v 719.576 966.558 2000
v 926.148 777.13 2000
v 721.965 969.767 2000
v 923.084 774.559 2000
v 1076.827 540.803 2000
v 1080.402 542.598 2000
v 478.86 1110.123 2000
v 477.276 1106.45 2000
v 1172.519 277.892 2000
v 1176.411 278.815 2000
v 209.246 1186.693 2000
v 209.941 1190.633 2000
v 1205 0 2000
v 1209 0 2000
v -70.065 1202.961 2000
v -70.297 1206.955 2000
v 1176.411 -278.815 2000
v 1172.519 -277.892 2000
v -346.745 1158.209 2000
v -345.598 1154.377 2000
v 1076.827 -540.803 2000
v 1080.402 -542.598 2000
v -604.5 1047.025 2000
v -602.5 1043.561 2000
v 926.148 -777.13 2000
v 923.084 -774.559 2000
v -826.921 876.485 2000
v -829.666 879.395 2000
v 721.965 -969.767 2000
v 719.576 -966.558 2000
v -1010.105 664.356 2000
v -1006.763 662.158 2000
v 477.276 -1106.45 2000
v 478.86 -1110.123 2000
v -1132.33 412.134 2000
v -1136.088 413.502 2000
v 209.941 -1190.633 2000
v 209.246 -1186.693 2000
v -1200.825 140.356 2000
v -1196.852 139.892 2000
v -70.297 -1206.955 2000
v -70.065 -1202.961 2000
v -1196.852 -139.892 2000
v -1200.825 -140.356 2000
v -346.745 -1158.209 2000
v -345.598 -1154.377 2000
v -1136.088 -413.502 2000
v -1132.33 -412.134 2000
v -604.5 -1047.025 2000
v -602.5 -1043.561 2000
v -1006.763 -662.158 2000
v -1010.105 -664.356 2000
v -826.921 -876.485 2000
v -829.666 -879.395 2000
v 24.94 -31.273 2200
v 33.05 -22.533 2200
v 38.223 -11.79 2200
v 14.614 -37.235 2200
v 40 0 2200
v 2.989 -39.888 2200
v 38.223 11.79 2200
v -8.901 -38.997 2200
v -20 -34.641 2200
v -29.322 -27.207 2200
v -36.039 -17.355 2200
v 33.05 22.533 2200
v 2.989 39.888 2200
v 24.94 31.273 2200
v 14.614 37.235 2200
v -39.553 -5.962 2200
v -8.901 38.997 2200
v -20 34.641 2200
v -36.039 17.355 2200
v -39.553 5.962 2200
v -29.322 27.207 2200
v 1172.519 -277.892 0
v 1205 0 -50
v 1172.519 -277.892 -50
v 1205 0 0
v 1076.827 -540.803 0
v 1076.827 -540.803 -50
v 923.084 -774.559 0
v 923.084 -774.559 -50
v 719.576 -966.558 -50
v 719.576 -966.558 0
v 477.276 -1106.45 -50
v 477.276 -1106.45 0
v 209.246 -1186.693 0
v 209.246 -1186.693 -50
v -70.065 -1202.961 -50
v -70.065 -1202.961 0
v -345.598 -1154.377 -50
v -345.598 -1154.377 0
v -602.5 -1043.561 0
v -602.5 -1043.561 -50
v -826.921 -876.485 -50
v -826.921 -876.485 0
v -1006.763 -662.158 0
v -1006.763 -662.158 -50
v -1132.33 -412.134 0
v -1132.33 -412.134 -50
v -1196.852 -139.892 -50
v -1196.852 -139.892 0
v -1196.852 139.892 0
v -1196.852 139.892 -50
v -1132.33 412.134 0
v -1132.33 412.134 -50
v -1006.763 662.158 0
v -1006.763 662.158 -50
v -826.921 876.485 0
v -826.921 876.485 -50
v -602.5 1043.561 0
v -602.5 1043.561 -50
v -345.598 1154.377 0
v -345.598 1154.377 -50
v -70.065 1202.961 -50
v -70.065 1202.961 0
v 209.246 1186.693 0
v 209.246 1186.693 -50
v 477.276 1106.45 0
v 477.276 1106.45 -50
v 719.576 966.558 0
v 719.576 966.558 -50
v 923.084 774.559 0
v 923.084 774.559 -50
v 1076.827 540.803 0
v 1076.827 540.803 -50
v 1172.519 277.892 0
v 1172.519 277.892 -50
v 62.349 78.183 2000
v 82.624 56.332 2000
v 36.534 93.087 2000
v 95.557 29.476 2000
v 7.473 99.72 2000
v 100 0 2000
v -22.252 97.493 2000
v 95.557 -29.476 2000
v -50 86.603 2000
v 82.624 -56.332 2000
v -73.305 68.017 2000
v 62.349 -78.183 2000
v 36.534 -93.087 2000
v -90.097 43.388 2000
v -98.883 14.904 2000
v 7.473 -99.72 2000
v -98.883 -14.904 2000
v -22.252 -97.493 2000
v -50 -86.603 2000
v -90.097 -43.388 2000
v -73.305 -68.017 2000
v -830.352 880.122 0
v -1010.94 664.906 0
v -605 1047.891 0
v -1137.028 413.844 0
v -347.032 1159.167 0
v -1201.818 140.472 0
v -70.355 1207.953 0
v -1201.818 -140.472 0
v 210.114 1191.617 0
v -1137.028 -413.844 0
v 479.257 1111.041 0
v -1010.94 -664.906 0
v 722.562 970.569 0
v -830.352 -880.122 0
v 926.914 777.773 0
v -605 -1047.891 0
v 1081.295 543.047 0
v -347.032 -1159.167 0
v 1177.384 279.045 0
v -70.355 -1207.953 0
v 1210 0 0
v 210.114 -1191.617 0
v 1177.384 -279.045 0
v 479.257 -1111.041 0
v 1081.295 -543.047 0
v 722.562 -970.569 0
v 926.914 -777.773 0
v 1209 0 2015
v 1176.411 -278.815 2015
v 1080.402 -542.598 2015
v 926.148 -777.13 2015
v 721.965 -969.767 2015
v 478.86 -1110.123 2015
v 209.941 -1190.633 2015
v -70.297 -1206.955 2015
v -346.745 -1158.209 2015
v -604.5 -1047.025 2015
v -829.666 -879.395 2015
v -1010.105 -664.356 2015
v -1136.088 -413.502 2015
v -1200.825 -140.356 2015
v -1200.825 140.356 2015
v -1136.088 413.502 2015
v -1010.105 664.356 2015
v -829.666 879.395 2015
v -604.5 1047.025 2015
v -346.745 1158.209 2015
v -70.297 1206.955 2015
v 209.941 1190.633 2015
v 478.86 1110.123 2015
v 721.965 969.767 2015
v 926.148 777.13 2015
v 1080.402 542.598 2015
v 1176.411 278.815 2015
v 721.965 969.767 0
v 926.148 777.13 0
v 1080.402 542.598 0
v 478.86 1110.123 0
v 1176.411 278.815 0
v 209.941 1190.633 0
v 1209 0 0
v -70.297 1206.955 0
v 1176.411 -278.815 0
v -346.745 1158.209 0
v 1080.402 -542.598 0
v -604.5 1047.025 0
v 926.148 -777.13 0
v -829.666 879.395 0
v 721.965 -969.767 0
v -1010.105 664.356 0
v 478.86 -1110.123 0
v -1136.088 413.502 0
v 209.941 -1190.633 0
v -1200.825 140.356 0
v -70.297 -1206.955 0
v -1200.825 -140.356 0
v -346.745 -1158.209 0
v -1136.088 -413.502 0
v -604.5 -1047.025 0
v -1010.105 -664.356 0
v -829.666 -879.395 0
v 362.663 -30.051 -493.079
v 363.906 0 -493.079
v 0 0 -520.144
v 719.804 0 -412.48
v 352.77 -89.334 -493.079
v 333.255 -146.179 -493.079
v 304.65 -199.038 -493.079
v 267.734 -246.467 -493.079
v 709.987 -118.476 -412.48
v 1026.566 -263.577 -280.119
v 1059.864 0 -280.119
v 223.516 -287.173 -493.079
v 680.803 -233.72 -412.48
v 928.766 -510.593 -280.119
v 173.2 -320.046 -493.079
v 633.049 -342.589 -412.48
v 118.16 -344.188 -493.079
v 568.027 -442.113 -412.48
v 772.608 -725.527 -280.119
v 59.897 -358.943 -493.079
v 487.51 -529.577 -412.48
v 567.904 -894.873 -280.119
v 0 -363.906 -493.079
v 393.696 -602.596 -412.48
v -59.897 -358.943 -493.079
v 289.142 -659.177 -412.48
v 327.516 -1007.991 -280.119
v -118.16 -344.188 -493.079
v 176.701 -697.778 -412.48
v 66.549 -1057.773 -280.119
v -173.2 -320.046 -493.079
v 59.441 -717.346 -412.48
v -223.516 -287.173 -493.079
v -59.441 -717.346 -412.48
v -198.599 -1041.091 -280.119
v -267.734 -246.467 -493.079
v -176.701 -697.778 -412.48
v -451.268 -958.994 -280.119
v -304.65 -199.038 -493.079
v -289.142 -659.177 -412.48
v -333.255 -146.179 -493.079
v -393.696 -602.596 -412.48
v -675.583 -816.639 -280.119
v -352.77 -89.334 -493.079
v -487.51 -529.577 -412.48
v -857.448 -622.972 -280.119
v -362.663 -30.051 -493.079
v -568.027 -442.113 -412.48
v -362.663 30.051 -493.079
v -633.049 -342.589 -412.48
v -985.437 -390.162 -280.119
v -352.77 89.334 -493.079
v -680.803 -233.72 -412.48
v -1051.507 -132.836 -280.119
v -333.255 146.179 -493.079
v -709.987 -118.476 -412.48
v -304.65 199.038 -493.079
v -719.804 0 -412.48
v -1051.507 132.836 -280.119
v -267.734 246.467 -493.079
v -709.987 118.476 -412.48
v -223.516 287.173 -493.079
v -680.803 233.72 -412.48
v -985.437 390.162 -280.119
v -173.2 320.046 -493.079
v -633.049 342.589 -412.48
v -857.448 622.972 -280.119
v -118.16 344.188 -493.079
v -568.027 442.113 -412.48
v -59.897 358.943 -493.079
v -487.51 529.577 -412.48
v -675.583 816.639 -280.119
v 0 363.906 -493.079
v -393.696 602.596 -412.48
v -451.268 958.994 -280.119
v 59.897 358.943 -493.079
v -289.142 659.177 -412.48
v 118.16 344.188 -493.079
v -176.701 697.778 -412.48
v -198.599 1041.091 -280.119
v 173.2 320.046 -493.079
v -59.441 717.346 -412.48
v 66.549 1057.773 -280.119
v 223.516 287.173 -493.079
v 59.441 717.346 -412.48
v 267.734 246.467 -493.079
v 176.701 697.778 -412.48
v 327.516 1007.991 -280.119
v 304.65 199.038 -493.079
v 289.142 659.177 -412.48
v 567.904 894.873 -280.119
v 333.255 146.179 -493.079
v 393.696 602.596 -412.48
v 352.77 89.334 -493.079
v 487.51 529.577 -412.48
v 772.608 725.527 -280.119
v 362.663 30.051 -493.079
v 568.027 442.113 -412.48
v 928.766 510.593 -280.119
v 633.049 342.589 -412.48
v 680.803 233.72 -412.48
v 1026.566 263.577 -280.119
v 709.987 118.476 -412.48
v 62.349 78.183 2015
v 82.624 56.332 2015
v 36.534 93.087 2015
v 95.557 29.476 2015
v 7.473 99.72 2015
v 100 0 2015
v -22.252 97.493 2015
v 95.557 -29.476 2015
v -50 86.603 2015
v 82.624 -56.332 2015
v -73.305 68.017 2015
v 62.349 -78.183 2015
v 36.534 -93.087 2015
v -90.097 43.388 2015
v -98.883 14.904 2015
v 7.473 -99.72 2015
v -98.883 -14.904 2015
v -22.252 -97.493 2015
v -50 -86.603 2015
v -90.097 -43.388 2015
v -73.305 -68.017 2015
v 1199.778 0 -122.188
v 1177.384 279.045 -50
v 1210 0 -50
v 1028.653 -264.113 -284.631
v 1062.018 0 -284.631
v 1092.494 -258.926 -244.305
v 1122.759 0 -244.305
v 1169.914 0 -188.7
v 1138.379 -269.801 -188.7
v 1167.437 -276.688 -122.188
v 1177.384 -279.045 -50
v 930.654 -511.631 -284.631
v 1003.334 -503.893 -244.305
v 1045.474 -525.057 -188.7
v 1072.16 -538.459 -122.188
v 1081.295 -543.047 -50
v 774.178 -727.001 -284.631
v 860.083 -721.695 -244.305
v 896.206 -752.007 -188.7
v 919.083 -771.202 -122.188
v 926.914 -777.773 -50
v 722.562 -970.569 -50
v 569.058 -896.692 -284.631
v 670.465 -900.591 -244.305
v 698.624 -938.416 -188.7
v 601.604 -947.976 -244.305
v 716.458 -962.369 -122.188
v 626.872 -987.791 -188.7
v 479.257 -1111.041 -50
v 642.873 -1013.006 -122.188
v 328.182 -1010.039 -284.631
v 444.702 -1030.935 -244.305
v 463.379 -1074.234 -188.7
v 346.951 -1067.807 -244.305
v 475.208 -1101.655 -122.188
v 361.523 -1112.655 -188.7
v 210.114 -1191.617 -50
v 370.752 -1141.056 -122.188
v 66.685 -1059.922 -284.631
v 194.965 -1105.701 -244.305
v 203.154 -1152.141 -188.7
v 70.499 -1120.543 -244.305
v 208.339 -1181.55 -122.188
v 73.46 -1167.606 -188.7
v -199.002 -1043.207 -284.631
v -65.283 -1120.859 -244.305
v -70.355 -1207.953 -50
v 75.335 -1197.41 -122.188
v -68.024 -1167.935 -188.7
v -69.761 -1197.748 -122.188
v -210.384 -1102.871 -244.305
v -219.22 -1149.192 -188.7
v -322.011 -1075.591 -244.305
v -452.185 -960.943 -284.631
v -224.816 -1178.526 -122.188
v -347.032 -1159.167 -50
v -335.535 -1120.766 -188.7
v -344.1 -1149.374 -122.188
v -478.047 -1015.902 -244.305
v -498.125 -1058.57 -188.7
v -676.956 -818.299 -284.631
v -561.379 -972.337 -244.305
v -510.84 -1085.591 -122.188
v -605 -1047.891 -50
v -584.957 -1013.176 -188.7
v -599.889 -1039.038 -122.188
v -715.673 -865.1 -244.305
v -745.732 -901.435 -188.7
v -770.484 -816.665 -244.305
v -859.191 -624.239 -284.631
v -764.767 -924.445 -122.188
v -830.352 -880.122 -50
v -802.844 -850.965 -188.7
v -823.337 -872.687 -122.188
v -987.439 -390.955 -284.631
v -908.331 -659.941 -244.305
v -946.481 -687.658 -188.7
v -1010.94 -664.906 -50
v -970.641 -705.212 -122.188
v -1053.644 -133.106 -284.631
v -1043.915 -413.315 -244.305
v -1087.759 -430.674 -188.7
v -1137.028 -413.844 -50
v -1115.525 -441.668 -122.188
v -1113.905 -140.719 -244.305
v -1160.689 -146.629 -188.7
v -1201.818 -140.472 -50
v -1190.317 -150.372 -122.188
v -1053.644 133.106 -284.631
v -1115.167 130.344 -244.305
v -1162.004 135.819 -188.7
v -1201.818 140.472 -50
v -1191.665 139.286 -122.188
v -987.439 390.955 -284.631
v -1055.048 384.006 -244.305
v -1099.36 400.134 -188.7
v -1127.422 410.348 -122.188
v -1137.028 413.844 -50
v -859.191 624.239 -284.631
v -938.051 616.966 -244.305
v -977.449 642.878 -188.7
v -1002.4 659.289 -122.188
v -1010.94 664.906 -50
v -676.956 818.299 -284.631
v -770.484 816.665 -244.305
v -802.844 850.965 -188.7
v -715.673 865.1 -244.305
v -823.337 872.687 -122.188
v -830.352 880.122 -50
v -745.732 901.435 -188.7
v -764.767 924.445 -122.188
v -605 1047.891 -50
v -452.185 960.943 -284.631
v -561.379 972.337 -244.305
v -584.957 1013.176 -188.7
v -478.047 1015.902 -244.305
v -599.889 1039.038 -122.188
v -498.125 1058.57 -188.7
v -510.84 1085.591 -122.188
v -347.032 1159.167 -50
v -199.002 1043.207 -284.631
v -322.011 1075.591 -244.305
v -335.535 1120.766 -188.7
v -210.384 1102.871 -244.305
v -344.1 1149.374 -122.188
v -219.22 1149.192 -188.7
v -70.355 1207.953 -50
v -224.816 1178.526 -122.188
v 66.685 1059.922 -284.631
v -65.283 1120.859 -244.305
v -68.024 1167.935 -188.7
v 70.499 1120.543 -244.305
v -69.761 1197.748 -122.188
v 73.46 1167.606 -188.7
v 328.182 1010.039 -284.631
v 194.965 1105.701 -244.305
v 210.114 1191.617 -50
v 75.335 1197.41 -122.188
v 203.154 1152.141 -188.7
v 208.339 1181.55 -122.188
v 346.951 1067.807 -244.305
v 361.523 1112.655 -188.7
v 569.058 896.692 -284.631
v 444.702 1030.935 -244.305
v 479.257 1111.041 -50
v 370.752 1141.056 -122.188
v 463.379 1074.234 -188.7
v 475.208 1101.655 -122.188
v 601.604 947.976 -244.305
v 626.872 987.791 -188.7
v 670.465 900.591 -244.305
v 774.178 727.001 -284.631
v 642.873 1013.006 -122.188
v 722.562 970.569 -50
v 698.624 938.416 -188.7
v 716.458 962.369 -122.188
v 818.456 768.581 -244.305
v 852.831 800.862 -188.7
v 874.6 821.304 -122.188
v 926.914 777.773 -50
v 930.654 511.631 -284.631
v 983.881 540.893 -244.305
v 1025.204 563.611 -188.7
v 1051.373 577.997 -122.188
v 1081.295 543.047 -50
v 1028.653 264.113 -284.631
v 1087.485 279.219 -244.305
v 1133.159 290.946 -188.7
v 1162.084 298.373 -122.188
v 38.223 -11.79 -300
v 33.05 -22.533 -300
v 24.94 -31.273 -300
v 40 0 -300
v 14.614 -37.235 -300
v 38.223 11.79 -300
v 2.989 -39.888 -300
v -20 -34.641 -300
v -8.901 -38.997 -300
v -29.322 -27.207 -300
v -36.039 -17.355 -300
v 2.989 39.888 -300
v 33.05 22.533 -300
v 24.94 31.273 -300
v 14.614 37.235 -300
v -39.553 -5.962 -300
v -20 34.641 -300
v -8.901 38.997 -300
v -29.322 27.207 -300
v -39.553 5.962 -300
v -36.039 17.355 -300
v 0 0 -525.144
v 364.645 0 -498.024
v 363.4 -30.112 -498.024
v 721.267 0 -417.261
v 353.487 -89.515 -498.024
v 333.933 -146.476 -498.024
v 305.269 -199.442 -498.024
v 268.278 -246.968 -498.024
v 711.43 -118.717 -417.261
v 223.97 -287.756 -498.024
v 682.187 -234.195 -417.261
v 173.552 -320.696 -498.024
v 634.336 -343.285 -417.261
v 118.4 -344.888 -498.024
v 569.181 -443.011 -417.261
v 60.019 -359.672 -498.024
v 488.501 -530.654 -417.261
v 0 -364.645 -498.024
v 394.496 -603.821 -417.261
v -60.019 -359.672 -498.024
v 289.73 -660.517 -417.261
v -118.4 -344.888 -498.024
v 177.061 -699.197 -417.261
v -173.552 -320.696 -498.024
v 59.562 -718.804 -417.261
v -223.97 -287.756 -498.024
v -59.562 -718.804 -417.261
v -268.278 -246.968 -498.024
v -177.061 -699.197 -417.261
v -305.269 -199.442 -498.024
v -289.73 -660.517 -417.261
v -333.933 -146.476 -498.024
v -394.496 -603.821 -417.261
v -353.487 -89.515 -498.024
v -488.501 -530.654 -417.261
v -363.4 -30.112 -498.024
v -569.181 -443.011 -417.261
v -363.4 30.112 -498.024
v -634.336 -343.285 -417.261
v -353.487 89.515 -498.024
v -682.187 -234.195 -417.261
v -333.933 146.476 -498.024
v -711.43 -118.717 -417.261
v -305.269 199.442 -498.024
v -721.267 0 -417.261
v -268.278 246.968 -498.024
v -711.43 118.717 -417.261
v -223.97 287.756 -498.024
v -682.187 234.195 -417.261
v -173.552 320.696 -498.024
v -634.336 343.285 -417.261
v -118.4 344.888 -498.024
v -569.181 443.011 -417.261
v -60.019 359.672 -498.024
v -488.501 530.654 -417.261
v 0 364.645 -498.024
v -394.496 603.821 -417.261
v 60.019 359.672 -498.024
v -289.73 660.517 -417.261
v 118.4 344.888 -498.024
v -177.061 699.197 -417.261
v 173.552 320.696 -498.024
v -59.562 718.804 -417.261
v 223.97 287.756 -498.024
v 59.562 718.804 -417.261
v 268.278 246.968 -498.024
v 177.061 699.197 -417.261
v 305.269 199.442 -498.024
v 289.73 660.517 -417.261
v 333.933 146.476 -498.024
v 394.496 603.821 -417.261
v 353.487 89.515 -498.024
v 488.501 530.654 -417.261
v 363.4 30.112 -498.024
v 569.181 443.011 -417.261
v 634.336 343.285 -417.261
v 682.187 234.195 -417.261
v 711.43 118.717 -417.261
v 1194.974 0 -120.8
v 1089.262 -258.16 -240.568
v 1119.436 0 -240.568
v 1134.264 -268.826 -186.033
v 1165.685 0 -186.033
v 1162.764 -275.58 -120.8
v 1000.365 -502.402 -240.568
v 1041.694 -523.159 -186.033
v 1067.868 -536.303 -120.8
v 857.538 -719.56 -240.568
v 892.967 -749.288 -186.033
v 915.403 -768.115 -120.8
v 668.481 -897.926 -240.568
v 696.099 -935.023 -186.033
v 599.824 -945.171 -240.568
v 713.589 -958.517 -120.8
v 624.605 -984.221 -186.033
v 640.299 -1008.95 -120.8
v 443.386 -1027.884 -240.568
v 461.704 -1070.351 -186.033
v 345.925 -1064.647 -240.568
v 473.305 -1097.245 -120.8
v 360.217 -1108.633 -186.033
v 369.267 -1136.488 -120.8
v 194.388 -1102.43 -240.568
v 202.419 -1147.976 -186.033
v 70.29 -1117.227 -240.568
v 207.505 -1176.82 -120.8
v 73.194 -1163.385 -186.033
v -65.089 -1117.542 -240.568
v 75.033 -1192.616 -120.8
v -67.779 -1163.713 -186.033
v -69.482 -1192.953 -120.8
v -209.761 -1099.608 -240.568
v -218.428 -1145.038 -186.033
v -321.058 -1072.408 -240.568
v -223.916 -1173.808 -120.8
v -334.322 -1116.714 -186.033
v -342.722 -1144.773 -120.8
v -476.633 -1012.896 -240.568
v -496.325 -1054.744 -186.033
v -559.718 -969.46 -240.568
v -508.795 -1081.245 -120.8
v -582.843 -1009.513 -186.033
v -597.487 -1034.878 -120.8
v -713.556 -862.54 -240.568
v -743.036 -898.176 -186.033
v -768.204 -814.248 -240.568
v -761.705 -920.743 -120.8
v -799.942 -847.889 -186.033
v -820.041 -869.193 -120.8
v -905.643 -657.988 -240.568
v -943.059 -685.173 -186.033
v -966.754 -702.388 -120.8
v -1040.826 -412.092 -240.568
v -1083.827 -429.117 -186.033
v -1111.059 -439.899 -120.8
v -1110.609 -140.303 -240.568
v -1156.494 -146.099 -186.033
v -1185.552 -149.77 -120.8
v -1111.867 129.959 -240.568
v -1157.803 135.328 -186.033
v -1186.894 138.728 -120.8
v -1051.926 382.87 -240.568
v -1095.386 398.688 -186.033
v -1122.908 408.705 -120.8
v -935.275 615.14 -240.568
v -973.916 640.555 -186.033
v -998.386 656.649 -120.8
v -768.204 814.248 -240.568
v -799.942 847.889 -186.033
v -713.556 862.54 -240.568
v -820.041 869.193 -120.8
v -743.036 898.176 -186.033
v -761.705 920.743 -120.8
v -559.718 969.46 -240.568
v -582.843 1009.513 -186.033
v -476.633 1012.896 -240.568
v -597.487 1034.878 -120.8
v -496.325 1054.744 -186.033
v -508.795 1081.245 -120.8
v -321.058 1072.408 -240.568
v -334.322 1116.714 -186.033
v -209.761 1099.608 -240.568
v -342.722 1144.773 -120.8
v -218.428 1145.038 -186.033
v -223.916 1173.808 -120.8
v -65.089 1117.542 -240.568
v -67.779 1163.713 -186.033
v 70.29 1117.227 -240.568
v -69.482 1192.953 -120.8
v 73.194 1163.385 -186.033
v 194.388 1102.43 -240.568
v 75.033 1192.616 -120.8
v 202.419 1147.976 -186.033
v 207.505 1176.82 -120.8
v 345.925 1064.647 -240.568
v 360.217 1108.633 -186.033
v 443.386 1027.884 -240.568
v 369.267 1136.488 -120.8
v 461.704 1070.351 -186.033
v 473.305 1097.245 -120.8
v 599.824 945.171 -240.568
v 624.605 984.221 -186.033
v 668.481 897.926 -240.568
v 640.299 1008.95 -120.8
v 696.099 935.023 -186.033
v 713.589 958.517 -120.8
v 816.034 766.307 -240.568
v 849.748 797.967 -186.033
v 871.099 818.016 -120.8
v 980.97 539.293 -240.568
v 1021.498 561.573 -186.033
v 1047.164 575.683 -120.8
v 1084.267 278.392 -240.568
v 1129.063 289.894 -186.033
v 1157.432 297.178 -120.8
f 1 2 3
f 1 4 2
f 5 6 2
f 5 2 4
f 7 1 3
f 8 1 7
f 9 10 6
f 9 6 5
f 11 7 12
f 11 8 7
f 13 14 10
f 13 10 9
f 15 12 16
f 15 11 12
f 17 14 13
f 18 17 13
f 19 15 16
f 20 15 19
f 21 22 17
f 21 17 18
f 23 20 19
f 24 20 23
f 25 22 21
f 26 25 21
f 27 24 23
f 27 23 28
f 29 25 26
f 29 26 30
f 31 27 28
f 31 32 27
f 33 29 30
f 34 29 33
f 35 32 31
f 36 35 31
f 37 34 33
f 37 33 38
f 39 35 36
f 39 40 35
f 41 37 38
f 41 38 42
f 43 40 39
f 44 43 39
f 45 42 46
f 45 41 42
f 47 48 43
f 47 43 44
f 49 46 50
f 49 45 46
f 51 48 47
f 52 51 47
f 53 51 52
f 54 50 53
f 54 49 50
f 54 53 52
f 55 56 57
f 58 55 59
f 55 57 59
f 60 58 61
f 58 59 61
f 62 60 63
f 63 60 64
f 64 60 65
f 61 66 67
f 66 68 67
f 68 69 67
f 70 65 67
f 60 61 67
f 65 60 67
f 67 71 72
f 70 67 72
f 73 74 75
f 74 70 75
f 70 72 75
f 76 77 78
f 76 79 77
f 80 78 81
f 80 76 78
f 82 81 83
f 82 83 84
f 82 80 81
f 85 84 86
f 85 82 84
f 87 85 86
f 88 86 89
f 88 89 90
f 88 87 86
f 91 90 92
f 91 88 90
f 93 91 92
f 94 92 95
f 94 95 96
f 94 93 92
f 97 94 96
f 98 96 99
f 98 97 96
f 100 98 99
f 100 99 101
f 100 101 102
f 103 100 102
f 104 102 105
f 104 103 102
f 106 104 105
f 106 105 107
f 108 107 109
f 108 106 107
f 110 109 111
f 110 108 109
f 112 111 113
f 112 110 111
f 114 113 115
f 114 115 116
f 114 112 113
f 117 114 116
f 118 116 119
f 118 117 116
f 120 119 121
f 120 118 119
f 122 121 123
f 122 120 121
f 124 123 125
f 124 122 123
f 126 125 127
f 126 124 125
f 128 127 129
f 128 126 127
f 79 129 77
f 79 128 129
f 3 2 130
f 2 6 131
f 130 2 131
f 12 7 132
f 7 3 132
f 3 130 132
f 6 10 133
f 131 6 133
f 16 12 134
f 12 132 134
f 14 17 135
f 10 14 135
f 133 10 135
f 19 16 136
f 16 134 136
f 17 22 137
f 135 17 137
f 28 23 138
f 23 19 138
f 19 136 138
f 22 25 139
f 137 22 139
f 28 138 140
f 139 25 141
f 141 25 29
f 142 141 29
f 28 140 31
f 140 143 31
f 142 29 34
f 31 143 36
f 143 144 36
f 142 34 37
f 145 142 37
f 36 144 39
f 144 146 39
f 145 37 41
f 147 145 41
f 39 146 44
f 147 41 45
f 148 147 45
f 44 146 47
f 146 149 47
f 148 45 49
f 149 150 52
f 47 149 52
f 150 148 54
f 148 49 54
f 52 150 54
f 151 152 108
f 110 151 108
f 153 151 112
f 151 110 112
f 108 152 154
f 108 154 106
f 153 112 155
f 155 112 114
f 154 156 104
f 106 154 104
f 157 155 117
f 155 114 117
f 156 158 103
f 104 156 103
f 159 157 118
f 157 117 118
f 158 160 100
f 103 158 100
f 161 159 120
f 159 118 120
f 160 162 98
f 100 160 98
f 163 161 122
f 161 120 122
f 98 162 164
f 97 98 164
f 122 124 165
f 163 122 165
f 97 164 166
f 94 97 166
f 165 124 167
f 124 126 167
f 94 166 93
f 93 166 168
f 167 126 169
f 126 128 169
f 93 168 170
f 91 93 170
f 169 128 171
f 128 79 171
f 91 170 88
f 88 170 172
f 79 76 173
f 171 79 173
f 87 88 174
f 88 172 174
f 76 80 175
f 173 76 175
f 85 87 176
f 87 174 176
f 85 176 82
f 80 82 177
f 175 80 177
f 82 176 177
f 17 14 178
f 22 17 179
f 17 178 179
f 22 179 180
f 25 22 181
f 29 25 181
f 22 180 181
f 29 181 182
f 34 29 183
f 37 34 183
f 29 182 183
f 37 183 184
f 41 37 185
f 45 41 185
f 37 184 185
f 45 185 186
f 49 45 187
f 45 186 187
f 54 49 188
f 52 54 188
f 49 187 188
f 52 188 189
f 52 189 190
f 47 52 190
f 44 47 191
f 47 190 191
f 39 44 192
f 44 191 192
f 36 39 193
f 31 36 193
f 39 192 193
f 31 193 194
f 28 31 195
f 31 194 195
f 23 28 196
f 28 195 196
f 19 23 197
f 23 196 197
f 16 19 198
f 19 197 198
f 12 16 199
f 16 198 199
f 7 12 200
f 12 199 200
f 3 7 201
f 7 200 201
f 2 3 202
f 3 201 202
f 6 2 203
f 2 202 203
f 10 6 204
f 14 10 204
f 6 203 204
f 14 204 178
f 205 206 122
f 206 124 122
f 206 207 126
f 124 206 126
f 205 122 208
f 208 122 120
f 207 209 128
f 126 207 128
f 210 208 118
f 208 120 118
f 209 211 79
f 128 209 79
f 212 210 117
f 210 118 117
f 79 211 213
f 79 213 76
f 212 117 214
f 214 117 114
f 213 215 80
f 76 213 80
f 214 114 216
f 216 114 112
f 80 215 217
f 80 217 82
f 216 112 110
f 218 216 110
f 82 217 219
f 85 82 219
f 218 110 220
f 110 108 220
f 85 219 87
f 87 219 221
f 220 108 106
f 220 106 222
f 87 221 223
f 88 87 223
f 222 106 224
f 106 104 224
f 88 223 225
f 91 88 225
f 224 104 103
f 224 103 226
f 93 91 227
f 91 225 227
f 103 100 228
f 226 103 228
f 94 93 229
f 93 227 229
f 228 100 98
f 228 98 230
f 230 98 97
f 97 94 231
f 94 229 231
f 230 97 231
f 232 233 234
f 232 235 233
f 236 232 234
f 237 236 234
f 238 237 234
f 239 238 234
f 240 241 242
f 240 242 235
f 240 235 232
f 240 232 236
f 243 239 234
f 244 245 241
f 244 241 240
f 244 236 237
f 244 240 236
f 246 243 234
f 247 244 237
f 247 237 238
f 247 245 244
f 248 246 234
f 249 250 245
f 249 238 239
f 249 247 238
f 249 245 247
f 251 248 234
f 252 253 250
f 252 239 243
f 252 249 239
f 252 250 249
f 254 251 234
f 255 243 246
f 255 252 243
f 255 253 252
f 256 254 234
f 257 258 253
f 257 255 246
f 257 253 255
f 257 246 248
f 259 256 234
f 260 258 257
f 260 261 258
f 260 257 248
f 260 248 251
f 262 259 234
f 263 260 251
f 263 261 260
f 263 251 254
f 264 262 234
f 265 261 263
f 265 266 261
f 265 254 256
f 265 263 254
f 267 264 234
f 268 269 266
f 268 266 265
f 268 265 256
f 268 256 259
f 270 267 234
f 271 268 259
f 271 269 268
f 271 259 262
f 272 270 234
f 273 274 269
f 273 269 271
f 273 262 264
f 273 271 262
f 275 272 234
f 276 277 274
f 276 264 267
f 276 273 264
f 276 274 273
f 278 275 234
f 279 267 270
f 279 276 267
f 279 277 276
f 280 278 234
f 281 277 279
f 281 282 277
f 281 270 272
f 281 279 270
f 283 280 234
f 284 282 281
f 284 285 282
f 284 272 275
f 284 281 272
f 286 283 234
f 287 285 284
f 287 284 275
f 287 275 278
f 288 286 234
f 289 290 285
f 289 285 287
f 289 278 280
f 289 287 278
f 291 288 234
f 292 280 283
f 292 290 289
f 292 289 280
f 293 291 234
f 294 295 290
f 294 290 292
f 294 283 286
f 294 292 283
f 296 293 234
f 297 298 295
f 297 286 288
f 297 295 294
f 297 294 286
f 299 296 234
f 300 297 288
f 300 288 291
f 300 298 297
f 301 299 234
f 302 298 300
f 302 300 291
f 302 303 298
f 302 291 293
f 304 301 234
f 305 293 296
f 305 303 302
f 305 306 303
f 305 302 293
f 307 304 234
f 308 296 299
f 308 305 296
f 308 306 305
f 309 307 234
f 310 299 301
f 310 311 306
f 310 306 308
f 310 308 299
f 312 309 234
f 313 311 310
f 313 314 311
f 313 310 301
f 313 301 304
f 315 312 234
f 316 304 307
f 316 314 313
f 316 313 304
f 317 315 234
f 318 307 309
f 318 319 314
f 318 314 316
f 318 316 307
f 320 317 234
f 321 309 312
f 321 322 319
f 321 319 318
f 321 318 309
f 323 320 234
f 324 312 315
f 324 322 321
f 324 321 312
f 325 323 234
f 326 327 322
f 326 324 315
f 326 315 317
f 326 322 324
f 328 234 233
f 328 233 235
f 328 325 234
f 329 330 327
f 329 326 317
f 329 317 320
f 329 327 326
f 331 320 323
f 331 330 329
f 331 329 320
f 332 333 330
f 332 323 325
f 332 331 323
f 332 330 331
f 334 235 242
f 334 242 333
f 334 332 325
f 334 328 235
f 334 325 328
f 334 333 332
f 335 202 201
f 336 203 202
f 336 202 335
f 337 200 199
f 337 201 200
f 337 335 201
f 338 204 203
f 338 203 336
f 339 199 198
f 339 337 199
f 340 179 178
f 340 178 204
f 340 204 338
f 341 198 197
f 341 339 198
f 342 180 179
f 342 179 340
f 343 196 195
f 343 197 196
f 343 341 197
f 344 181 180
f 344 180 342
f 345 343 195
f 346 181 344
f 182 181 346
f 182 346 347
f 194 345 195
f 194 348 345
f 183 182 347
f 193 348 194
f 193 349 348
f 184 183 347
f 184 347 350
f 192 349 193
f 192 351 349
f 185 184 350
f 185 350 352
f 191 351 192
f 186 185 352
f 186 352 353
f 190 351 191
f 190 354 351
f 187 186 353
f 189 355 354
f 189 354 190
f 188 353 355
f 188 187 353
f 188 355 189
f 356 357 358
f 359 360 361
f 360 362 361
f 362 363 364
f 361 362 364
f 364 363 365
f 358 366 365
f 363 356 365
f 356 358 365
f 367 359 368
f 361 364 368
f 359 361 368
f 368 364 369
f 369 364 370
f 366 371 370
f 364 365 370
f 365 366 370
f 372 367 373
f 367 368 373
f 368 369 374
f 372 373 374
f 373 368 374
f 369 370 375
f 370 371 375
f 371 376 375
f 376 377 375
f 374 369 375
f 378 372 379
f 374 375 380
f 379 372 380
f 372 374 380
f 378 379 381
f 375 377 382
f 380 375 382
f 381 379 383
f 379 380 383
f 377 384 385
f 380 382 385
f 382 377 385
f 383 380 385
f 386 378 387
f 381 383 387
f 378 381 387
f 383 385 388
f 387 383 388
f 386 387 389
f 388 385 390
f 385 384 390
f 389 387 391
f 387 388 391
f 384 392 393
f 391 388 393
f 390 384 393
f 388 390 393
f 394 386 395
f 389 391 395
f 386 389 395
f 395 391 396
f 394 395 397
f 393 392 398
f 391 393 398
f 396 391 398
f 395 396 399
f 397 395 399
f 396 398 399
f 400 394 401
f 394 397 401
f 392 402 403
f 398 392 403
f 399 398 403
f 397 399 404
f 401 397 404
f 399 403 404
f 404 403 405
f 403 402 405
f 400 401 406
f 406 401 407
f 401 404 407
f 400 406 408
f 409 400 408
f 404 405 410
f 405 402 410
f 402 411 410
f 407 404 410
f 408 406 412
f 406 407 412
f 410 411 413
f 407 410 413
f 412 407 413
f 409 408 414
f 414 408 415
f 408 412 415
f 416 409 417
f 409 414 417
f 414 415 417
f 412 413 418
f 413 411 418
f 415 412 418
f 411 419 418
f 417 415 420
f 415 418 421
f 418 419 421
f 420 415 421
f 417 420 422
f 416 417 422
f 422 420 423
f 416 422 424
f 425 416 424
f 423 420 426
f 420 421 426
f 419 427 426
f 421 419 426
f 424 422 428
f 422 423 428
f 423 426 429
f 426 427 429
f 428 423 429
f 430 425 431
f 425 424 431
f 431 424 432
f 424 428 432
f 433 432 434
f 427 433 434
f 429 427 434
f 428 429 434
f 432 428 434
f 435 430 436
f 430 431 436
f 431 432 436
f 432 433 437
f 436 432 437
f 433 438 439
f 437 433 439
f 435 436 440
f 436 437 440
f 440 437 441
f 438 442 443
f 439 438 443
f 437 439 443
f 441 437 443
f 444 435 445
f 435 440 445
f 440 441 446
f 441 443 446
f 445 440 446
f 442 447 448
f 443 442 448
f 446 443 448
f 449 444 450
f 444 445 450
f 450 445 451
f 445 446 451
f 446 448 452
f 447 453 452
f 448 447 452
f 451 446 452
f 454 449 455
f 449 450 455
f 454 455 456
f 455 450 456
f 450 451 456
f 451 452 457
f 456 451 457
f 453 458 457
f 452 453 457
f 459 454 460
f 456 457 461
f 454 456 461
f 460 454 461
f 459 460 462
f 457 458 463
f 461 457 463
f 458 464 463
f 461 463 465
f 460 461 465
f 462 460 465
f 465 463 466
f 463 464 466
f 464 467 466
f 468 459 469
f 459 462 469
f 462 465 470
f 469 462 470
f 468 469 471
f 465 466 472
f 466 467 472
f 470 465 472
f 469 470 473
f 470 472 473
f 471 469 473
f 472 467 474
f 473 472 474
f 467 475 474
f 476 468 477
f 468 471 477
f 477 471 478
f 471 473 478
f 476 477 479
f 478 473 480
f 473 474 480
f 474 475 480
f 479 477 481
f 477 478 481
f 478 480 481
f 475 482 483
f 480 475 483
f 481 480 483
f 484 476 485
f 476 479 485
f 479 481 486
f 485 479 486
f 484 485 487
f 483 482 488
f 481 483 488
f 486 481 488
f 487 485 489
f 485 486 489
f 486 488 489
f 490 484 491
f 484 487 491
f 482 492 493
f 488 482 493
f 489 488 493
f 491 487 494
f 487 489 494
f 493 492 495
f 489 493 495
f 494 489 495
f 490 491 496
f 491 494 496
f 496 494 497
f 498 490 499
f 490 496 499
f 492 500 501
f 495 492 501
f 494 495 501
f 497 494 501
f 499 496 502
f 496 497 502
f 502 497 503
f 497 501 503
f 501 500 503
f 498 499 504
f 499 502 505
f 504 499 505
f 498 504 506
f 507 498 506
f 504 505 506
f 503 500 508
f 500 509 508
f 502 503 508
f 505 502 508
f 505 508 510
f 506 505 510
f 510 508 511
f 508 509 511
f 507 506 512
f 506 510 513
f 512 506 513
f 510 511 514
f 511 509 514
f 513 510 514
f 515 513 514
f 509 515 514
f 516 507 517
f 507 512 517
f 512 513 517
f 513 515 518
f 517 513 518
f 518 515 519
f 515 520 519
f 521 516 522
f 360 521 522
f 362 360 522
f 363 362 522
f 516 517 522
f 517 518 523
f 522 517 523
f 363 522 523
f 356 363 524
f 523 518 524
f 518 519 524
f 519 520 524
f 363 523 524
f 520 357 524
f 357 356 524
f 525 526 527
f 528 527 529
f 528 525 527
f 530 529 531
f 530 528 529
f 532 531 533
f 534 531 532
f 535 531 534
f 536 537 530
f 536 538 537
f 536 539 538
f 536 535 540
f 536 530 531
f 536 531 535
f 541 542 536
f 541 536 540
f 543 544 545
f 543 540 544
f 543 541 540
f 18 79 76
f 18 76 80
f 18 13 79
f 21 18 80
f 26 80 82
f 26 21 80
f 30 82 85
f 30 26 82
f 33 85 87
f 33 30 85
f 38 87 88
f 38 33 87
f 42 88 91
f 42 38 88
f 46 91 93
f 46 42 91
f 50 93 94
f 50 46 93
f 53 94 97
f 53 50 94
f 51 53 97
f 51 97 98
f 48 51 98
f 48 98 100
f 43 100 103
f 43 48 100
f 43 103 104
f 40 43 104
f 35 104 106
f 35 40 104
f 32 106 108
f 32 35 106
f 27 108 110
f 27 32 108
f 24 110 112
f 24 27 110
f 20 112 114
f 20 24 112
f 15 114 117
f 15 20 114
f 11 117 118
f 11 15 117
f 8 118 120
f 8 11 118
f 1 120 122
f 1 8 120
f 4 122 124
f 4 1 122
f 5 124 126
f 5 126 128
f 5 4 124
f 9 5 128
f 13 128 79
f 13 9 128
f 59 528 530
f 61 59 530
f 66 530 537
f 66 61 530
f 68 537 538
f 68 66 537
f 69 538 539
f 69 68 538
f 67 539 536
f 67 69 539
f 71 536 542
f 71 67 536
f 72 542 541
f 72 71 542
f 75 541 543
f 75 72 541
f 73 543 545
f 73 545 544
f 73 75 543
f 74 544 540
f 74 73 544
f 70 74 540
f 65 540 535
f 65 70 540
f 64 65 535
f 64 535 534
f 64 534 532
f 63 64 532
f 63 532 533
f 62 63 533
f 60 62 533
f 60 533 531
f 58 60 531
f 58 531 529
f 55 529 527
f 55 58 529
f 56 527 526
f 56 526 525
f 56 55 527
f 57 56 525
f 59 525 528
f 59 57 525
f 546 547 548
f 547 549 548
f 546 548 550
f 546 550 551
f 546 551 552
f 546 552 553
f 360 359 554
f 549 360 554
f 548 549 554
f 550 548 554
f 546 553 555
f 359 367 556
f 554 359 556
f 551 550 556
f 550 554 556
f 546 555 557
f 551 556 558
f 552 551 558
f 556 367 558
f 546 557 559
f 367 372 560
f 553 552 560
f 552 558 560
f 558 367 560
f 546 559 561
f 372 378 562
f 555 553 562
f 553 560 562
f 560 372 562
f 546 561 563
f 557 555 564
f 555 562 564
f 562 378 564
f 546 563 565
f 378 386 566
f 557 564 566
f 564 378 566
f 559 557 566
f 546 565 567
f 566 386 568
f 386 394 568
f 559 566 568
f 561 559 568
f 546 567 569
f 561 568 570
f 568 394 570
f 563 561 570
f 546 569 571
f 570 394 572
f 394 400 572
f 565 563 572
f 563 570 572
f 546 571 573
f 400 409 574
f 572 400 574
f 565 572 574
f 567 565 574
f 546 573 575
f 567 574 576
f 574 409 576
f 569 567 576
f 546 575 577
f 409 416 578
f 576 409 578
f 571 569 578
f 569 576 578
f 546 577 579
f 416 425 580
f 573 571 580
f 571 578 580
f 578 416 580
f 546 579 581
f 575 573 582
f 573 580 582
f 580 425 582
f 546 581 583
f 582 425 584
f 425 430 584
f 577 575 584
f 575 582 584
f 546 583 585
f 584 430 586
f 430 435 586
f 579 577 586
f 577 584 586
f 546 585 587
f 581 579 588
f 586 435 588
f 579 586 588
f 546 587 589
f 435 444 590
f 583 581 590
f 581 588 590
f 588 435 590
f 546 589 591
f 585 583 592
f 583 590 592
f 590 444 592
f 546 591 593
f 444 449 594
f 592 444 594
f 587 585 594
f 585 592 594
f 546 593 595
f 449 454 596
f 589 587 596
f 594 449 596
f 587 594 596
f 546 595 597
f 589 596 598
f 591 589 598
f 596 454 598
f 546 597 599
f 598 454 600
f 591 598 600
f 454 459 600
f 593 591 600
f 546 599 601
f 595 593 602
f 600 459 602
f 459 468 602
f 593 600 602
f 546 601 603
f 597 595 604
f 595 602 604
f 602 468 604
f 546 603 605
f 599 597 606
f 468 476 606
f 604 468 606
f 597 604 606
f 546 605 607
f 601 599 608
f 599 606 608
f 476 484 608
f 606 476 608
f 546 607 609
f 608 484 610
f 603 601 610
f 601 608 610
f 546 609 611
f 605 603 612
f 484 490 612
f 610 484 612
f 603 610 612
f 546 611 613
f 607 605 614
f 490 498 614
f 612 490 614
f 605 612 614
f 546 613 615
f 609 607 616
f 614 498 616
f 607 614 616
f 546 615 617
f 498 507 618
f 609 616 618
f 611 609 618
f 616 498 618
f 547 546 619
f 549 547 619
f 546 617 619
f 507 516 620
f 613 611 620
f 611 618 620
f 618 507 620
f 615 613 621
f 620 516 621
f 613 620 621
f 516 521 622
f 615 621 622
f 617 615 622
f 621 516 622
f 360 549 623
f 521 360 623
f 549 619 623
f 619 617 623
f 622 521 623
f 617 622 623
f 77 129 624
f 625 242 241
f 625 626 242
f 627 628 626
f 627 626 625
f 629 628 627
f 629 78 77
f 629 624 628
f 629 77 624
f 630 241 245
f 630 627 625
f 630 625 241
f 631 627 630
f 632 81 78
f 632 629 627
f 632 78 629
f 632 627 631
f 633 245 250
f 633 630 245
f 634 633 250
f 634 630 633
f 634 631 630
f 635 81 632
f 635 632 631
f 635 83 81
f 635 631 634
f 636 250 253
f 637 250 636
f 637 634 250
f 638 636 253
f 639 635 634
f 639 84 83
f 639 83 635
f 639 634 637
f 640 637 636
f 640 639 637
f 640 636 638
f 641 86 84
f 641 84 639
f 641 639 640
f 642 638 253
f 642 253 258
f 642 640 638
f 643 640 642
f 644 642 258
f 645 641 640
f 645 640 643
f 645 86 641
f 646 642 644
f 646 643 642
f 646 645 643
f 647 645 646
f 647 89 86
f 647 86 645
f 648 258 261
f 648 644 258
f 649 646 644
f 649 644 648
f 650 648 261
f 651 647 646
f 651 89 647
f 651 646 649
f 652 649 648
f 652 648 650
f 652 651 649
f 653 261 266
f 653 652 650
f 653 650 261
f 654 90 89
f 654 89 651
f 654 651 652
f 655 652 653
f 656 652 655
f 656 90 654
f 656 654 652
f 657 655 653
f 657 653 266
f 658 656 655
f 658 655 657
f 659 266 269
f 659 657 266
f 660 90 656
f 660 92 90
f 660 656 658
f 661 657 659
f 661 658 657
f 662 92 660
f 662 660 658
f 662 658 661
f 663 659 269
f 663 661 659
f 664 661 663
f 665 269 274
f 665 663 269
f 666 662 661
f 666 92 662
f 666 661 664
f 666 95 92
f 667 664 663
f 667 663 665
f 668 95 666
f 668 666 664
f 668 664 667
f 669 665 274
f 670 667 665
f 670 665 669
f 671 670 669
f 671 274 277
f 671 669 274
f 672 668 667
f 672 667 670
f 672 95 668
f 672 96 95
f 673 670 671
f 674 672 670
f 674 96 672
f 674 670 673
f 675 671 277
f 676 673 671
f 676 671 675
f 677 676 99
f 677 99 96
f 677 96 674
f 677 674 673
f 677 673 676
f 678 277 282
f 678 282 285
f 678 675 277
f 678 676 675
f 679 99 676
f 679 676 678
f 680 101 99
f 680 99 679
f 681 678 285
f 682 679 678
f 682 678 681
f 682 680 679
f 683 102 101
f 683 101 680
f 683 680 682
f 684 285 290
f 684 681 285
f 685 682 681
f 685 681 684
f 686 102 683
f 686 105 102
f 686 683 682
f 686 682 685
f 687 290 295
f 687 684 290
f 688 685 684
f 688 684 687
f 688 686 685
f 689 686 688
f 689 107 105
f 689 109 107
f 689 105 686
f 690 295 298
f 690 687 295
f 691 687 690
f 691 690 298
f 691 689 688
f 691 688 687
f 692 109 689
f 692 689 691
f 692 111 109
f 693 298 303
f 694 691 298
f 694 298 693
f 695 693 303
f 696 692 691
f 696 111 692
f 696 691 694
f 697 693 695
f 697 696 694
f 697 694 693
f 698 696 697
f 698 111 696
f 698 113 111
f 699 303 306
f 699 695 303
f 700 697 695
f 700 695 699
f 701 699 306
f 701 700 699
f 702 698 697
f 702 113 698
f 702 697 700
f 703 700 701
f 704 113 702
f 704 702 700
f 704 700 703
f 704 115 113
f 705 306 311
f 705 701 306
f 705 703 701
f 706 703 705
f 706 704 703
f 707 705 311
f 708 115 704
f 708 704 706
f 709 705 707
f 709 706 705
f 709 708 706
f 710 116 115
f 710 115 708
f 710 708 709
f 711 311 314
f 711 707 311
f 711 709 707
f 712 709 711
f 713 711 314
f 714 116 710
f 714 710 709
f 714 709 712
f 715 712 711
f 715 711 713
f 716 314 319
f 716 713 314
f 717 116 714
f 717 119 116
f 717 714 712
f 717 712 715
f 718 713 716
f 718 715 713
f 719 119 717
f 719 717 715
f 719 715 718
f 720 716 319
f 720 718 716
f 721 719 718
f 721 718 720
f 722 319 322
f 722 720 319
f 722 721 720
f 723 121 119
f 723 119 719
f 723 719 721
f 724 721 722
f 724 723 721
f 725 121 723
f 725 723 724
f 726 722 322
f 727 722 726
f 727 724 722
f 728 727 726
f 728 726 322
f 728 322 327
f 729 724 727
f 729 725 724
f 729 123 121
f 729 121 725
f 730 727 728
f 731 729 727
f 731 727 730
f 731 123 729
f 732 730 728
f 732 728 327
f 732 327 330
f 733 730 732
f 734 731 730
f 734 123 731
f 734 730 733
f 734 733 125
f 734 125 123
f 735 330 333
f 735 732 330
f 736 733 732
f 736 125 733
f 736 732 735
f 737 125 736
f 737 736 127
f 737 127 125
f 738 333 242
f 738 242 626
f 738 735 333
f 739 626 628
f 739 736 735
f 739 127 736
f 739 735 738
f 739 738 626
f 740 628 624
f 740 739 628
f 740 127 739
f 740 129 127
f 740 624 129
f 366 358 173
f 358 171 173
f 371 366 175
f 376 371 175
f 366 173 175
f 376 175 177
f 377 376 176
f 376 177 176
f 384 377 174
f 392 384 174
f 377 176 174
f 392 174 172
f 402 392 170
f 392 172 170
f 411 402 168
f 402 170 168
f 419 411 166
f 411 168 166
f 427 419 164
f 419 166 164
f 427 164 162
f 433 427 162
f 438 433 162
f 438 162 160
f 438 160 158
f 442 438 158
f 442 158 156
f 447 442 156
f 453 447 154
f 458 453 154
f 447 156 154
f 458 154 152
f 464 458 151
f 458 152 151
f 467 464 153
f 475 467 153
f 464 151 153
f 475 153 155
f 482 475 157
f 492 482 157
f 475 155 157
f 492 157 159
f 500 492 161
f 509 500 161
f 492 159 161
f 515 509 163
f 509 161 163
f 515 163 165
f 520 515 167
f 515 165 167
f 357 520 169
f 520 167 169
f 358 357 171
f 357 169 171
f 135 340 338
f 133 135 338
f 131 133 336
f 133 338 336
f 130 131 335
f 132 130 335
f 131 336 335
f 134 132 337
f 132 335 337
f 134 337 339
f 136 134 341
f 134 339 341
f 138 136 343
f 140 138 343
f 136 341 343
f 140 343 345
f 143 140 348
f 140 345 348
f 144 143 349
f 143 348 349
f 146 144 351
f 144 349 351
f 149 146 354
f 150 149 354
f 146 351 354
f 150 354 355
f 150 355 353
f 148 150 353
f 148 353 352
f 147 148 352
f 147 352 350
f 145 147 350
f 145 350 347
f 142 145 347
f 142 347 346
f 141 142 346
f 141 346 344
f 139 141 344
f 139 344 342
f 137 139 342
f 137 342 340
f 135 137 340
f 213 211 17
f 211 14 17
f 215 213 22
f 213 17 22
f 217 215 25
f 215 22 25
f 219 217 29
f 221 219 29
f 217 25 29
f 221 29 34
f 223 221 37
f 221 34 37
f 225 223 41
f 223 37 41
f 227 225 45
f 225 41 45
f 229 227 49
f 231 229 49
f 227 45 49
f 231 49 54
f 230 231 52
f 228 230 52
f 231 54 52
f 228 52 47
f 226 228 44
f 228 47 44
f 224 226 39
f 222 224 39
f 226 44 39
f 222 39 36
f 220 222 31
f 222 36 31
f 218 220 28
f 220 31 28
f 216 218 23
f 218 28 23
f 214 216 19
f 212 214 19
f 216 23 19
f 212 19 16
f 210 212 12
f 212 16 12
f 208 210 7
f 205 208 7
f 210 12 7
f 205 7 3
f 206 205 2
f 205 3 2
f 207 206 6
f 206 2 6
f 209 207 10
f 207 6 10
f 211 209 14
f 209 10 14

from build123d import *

# Parameters (mm, degrees)
F9_T     = -5
F10_W    = 4
F10_H    = 2000
F11_W    = 1209
F11_H    = 15
F3_R     = 100
F4_DEPTH = 2540.1454776065
F12_W    = 40
F12_H    = 2500


with BuildPart() as f8:
    # F0 (on Front) → F8 (revolve)
    with BuildSketch(Plane.XZ):
        with BuildLine():
            Line((0, 0), (0, -525.1444776065))
            ThreePointArc((0, -525.1444776065), (544.4559275248, -464.2644294772), (1062.0181405896, -284.6314901689))
            ThreePointArc((1062.0181405896, -284.6314901689), (1169.9144339889, -188.6998259673), (1210, -50))
            Line((1210, -50), (1210, 0))
            Line((1210, 0), (0, 0))
        make_face()
    revolve(axis=Axis((0, 0, -262.5722388032), (0, 0, -1)))

    # F9
    f9_openings = [f8.faces().sort_by_distance(p)[0] for p in [
        (0, 0, 0),
    ]]
    offset(amount=F9_T, openings=f9_openings)


with BuildPart() as f1:
    # F10 (on Front) → F1 (revolve)
    with BuildSketch(Plane.XZ):
        with Locations((1207, 1000)):
            Rectangle(F10_W, F10_H)
    revolve(axis=Axis((0, 0, -262.5722388032), (0, 0, -1)))


with BuildPart() as f2:
    # F11 (on Front) → F2 (revolve)
    with BuildSketch(Plane.XZ):
        with Locations((604.5, 2007.5)):
            Rectangle(F11_W, F11_H)
    revolve(axis=Axis((0, 0, 2007.5), (0, 0, -1)))

    # F3 (on face) → F4 (cut, through all)
    with BuildSketch(Plane.XY.offset(2015)):
        Circle(F3_R)
    extrude(amount=-F4_DEPTH, mode=Mode.SUBTRACT)


with BuildPart() as f6:
    # F12 (on Front) → F6 (revolve)
    with BuildSketch(Plane.XZ):
        with Locations((20, 950)):
            Rectangle(F12_W, F12_H)
    revolve(axis=Axis((0, 0, 78.9392143488), (0, 0, 1)))


solid = Compound([f8.part, f1.part, f2.part, f6.part])
